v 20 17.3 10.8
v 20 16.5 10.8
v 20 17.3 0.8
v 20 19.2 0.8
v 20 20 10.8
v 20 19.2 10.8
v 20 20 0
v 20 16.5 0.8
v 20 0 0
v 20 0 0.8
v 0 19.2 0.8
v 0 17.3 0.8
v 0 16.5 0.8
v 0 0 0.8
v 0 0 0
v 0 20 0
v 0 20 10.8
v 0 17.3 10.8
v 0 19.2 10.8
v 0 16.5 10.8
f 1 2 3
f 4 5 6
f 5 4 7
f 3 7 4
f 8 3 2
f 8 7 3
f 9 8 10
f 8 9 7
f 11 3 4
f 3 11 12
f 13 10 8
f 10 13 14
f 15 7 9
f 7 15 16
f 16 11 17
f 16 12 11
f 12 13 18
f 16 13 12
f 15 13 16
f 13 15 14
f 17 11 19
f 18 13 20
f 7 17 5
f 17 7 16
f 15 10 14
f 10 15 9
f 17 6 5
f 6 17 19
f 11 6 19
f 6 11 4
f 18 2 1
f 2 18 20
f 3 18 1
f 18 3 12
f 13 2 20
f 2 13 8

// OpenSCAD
gapWidth = 1.9;
holdersLength = 10;
labelWidth = 20;
labelLength = 20;
thickness = 0.8;

module holder() {
    cube([labelWidth, thickness, holdersLength]);
}

// top part
cube([labelWidth, labelLength, thickness]);
translate([0, labelLength-thickness, thickness]) holder();
translate([0, labelLength-thickness*2-gapWidth, thickness]) holder();
